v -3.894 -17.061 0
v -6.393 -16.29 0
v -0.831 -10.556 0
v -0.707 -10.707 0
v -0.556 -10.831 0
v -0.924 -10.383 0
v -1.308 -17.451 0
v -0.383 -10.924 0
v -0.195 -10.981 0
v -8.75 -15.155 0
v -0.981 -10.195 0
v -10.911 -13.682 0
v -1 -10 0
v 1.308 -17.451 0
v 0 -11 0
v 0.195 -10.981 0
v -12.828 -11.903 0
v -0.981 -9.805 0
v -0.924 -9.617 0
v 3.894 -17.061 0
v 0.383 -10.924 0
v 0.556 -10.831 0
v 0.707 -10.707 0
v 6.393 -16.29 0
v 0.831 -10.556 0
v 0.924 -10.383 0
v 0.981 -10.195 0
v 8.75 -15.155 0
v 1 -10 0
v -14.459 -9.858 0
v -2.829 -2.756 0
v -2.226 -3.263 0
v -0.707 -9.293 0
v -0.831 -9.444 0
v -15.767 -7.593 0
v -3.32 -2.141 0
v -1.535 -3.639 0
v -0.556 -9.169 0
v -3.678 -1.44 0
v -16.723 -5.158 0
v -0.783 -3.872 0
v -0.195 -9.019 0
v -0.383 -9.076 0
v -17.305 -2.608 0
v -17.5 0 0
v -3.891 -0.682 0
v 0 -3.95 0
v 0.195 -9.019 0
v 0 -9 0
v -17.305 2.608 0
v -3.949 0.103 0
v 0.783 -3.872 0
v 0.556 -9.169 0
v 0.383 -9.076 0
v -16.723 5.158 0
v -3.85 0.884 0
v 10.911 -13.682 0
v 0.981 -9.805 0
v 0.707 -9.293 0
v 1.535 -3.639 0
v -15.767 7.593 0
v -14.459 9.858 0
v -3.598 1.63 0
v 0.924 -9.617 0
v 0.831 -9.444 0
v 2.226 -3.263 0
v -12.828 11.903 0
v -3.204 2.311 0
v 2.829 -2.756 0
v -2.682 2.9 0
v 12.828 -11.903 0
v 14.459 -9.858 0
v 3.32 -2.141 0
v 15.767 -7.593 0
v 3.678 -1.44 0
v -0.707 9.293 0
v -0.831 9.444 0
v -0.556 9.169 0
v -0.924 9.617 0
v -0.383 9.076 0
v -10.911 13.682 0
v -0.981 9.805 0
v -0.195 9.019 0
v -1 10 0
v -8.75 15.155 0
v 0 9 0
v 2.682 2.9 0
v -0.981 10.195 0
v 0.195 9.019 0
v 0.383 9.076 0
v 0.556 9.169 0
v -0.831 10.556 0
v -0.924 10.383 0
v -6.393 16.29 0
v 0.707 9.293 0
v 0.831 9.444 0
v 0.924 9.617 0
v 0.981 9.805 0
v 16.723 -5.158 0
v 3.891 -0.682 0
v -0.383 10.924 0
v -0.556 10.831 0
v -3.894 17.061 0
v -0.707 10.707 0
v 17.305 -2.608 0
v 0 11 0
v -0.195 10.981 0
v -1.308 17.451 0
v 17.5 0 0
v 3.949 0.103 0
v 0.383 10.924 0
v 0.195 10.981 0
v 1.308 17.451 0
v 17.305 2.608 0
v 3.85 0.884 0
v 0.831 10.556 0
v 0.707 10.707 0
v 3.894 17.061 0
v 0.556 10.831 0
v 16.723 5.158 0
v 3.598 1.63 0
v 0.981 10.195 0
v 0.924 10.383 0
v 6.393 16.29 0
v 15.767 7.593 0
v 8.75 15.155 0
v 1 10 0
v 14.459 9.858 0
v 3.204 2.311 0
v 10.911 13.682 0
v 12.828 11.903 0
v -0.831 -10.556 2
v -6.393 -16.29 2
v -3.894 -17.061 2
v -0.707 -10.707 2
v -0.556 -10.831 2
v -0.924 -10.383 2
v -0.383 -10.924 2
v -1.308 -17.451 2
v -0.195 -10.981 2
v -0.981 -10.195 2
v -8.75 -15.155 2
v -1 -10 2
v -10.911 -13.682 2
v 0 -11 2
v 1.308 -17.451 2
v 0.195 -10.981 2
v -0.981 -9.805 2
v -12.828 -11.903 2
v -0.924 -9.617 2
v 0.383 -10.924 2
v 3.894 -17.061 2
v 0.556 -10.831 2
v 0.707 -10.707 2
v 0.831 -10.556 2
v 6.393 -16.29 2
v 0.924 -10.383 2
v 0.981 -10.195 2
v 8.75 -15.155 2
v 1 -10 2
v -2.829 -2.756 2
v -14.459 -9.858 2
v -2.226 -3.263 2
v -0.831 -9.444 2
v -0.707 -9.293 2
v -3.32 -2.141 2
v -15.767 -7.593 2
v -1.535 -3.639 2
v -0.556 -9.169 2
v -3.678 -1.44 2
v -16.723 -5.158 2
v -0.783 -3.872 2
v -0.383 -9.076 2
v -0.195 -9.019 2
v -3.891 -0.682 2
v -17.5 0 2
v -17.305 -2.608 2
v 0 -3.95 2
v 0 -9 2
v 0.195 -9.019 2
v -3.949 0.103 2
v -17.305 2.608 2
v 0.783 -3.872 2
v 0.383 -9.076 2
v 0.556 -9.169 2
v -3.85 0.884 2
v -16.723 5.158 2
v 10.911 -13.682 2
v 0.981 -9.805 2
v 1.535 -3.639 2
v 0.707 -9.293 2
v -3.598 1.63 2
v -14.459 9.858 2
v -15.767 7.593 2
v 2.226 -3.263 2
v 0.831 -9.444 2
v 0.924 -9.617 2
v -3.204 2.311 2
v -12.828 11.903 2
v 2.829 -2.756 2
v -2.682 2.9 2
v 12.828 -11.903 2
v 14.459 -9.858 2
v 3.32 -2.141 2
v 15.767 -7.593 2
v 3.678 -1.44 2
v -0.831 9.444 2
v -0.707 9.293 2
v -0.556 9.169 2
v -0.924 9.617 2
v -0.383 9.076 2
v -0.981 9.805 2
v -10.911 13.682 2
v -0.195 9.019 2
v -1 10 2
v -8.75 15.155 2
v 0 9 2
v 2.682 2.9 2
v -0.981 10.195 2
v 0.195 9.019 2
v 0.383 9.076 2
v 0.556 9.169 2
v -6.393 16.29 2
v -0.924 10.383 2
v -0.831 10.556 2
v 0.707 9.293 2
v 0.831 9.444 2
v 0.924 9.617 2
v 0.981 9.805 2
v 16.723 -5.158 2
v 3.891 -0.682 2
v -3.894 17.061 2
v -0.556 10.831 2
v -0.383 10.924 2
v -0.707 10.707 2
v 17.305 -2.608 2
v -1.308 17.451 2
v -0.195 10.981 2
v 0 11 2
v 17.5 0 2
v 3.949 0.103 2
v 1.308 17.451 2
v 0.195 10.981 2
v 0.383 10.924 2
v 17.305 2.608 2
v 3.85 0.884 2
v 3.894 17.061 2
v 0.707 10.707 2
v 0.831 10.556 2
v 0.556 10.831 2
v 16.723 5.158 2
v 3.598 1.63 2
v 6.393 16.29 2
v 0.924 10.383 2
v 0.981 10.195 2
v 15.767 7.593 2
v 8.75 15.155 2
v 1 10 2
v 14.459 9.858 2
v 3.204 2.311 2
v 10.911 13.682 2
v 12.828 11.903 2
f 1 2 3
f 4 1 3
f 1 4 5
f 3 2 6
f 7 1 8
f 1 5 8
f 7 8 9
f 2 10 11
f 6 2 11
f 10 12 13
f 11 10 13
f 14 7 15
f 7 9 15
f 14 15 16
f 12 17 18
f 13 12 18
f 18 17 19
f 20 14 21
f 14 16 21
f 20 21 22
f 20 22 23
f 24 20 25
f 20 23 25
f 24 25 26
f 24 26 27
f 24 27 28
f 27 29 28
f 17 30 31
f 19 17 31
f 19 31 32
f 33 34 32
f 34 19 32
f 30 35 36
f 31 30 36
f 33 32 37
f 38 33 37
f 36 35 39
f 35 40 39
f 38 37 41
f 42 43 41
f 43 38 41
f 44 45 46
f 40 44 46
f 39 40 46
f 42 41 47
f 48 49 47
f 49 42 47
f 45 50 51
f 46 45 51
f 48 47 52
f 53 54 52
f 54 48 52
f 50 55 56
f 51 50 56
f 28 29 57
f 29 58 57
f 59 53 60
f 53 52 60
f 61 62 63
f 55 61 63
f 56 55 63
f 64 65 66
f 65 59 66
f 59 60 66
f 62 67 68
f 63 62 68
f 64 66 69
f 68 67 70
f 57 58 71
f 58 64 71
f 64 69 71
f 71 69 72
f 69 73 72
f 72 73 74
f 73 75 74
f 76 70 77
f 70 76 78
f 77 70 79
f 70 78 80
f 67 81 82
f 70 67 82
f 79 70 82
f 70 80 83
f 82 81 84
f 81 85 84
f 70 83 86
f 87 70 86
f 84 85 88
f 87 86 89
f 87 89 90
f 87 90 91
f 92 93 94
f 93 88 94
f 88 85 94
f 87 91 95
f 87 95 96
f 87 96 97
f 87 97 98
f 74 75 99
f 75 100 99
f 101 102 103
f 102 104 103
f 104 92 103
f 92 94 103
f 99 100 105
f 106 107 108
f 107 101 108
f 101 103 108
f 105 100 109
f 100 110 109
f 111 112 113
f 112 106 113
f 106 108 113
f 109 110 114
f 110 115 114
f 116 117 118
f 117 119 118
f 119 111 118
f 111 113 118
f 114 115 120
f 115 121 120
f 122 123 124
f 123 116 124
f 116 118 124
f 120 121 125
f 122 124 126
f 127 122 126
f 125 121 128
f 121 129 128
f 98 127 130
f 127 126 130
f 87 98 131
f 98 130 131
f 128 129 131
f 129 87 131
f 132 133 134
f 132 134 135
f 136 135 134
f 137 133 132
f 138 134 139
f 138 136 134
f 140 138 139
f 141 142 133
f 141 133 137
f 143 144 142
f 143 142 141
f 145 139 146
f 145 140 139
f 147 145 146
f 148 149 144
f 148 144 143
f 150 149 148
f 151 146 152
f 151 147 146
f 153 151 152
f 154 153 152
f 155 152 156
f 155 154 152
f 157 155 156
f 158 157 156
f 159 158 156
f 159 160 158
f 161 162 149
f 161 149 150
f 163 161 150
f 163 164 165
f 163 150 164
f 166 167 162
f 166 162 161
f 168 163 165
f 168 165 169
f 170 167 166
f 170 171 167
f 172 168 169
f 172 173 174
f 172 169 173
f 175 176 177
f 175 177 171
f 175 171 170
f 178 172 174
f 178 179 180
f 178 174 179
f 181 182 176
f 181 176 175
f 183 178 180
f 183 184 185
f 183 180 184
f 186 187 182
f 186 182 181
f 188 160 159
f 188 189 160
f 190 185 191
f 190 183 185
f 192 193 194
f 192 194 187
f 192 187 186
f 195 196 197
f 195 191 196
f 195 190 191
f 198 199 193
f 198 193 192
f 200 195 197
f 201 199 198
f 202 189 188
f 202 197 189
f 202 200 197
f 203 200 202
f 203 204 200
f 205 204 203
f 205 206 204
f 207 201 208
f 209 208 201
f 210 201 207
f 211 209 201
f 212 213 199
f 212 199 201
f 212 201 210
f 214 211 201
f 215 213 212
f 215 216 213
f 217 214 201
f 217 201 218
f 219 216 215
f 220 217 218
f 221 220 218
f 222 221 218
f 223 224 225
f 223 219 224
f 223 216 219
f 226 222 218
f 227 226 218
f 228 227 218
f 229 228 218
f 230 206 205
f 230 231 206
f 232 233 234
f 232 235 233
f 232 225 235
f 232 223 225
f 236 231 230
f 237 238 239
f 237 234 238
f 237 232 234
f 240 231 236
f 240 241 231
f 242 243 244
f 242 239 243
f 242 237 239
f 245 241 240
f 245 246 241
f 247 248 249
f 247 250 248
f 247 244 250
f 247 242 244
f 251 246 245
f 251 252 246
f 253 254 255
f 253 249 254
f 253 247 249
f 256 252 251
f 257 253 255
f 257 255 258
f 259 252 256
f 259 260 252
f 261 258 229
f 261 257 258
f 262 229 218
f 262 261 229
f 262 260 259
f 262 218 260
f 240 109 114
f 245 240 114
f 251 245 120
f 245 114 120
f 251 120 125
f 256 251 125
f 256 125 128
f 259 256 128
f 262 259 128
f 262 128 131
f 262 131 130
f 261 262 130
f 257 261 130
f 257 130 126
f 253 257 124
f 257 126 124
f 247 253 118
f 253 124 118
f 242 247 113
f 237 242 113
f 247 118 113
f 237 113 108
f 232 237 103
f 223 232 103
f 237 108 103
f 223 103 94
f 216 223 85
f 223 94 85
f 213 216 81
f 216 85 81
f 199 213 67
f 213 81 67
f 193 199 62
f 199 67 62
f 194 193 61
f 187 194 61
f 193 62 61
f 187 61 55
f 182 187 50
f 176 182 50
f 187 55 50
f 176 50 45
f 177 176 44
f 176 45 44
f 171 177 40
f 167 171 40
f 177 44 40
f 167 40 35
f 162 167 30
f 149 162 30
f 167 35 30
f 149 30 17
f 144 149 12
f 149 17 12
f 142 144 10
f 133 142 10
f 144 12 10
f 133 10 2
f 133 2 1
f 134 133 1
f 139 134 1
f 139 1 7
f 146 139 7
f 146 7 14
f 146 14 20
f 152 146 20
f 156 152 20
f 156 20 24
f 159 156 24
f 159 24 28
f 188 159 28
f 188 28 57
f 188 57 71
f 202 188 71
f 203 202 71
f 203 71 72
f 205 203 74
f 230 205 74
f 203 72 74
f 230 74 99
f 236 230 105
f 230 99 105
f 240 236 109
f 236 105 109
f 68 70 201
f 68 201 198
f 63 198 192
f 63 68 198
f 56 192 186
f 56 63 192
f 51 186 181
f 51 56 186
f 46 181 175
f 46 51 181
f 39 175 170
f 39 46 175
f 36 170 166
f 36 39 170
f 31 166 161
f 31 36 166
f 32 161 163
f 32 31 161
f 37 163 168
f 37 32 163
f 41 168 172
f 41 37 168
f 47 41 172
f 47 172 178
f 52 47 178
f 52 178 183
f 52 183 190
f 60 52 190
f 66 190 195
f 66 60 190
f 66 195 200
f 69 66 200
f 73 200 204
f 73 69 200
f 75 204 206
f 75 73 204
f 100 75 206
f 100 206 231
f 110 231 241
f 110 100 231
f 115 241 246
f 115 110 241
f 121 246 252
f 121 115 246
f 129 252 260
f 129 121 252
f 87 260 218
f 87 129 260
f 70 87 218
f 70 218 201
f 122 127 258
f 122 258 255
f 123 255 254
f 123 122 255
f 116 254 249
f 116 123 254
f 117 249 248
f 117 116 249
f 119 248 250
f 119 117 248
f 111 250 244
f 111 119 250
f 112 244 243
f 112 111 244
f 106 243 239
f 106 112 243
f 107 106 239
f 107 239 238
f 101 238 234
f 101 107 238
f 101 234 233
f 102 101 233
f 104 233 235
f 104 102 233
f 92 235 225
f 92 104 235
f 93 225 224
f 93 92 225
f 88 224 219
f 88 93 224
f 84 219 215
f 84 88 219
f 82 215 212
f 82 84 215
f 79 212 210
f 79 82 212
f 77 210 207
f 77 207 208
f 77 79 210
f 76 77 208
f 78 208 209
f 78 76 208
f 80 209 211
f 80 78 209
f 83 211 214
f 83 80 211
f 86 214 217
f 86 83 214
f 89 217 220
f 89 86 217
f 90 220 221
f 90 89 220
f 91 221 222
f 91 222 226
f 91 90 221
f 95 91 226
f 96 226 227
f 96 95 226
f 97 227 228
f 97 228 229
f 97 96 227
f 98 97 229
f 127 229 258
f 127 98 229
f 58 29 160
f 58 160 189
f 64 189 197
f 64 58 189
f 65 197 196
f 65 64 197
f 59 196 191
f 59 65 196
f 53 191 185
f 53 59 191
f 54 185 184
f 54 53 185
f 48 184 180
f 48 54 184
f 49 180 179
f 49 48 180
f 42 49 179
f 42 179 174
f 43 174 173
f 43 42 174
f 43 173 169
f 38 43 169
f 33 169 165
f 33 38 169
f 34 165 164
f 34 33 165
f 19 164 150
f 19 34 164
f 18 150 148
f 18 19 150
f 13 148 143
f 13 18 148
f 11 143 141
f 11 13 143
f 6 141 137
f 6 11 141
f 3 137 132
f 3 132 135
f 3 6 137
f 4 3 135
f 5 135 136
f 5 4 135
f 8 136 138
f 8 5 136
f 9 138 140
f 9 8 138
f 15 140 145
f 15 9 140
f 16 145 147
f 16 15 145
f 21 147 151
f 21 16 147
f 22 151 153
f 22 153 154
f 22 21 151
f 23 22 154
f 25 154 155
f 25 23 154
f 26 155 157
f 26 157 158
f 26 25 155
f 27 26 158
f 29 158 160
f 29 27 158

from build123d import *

# Parameters (mm, degrees)
SKETCH_1_R      = 17.5
SKETCH_1_R_2    = 1
EXTRUDE_1_DEPTH = 2


with BuildPart() as part:
    # Эскиз1 → Бобышка-Вытянуть1 (new body)
    with BuildSketch(Plane.XY):
        Circle(SKETCH_1_R)
        with Locations((0, 10)):
            Circle(SKETCH_1_R_2, mode=Mode.SUBTRACT)
        with Locations((0, -10)):
            Circle(SKETCH_1_R_2, mode=Mode.SUBTRACT)
        with BuildLine():
            Line((2.681883666, 2.9), (-2.681883666, 2.9))
            ThreePointArc((-2.681883666, 2.9), (0, -3.95), (2.681883666, 2.9))
        make_face(mode=Mode.SUBTRACT)
    extrude(amount=EXTRUDE_1_DEPTH)


solid = part.part
